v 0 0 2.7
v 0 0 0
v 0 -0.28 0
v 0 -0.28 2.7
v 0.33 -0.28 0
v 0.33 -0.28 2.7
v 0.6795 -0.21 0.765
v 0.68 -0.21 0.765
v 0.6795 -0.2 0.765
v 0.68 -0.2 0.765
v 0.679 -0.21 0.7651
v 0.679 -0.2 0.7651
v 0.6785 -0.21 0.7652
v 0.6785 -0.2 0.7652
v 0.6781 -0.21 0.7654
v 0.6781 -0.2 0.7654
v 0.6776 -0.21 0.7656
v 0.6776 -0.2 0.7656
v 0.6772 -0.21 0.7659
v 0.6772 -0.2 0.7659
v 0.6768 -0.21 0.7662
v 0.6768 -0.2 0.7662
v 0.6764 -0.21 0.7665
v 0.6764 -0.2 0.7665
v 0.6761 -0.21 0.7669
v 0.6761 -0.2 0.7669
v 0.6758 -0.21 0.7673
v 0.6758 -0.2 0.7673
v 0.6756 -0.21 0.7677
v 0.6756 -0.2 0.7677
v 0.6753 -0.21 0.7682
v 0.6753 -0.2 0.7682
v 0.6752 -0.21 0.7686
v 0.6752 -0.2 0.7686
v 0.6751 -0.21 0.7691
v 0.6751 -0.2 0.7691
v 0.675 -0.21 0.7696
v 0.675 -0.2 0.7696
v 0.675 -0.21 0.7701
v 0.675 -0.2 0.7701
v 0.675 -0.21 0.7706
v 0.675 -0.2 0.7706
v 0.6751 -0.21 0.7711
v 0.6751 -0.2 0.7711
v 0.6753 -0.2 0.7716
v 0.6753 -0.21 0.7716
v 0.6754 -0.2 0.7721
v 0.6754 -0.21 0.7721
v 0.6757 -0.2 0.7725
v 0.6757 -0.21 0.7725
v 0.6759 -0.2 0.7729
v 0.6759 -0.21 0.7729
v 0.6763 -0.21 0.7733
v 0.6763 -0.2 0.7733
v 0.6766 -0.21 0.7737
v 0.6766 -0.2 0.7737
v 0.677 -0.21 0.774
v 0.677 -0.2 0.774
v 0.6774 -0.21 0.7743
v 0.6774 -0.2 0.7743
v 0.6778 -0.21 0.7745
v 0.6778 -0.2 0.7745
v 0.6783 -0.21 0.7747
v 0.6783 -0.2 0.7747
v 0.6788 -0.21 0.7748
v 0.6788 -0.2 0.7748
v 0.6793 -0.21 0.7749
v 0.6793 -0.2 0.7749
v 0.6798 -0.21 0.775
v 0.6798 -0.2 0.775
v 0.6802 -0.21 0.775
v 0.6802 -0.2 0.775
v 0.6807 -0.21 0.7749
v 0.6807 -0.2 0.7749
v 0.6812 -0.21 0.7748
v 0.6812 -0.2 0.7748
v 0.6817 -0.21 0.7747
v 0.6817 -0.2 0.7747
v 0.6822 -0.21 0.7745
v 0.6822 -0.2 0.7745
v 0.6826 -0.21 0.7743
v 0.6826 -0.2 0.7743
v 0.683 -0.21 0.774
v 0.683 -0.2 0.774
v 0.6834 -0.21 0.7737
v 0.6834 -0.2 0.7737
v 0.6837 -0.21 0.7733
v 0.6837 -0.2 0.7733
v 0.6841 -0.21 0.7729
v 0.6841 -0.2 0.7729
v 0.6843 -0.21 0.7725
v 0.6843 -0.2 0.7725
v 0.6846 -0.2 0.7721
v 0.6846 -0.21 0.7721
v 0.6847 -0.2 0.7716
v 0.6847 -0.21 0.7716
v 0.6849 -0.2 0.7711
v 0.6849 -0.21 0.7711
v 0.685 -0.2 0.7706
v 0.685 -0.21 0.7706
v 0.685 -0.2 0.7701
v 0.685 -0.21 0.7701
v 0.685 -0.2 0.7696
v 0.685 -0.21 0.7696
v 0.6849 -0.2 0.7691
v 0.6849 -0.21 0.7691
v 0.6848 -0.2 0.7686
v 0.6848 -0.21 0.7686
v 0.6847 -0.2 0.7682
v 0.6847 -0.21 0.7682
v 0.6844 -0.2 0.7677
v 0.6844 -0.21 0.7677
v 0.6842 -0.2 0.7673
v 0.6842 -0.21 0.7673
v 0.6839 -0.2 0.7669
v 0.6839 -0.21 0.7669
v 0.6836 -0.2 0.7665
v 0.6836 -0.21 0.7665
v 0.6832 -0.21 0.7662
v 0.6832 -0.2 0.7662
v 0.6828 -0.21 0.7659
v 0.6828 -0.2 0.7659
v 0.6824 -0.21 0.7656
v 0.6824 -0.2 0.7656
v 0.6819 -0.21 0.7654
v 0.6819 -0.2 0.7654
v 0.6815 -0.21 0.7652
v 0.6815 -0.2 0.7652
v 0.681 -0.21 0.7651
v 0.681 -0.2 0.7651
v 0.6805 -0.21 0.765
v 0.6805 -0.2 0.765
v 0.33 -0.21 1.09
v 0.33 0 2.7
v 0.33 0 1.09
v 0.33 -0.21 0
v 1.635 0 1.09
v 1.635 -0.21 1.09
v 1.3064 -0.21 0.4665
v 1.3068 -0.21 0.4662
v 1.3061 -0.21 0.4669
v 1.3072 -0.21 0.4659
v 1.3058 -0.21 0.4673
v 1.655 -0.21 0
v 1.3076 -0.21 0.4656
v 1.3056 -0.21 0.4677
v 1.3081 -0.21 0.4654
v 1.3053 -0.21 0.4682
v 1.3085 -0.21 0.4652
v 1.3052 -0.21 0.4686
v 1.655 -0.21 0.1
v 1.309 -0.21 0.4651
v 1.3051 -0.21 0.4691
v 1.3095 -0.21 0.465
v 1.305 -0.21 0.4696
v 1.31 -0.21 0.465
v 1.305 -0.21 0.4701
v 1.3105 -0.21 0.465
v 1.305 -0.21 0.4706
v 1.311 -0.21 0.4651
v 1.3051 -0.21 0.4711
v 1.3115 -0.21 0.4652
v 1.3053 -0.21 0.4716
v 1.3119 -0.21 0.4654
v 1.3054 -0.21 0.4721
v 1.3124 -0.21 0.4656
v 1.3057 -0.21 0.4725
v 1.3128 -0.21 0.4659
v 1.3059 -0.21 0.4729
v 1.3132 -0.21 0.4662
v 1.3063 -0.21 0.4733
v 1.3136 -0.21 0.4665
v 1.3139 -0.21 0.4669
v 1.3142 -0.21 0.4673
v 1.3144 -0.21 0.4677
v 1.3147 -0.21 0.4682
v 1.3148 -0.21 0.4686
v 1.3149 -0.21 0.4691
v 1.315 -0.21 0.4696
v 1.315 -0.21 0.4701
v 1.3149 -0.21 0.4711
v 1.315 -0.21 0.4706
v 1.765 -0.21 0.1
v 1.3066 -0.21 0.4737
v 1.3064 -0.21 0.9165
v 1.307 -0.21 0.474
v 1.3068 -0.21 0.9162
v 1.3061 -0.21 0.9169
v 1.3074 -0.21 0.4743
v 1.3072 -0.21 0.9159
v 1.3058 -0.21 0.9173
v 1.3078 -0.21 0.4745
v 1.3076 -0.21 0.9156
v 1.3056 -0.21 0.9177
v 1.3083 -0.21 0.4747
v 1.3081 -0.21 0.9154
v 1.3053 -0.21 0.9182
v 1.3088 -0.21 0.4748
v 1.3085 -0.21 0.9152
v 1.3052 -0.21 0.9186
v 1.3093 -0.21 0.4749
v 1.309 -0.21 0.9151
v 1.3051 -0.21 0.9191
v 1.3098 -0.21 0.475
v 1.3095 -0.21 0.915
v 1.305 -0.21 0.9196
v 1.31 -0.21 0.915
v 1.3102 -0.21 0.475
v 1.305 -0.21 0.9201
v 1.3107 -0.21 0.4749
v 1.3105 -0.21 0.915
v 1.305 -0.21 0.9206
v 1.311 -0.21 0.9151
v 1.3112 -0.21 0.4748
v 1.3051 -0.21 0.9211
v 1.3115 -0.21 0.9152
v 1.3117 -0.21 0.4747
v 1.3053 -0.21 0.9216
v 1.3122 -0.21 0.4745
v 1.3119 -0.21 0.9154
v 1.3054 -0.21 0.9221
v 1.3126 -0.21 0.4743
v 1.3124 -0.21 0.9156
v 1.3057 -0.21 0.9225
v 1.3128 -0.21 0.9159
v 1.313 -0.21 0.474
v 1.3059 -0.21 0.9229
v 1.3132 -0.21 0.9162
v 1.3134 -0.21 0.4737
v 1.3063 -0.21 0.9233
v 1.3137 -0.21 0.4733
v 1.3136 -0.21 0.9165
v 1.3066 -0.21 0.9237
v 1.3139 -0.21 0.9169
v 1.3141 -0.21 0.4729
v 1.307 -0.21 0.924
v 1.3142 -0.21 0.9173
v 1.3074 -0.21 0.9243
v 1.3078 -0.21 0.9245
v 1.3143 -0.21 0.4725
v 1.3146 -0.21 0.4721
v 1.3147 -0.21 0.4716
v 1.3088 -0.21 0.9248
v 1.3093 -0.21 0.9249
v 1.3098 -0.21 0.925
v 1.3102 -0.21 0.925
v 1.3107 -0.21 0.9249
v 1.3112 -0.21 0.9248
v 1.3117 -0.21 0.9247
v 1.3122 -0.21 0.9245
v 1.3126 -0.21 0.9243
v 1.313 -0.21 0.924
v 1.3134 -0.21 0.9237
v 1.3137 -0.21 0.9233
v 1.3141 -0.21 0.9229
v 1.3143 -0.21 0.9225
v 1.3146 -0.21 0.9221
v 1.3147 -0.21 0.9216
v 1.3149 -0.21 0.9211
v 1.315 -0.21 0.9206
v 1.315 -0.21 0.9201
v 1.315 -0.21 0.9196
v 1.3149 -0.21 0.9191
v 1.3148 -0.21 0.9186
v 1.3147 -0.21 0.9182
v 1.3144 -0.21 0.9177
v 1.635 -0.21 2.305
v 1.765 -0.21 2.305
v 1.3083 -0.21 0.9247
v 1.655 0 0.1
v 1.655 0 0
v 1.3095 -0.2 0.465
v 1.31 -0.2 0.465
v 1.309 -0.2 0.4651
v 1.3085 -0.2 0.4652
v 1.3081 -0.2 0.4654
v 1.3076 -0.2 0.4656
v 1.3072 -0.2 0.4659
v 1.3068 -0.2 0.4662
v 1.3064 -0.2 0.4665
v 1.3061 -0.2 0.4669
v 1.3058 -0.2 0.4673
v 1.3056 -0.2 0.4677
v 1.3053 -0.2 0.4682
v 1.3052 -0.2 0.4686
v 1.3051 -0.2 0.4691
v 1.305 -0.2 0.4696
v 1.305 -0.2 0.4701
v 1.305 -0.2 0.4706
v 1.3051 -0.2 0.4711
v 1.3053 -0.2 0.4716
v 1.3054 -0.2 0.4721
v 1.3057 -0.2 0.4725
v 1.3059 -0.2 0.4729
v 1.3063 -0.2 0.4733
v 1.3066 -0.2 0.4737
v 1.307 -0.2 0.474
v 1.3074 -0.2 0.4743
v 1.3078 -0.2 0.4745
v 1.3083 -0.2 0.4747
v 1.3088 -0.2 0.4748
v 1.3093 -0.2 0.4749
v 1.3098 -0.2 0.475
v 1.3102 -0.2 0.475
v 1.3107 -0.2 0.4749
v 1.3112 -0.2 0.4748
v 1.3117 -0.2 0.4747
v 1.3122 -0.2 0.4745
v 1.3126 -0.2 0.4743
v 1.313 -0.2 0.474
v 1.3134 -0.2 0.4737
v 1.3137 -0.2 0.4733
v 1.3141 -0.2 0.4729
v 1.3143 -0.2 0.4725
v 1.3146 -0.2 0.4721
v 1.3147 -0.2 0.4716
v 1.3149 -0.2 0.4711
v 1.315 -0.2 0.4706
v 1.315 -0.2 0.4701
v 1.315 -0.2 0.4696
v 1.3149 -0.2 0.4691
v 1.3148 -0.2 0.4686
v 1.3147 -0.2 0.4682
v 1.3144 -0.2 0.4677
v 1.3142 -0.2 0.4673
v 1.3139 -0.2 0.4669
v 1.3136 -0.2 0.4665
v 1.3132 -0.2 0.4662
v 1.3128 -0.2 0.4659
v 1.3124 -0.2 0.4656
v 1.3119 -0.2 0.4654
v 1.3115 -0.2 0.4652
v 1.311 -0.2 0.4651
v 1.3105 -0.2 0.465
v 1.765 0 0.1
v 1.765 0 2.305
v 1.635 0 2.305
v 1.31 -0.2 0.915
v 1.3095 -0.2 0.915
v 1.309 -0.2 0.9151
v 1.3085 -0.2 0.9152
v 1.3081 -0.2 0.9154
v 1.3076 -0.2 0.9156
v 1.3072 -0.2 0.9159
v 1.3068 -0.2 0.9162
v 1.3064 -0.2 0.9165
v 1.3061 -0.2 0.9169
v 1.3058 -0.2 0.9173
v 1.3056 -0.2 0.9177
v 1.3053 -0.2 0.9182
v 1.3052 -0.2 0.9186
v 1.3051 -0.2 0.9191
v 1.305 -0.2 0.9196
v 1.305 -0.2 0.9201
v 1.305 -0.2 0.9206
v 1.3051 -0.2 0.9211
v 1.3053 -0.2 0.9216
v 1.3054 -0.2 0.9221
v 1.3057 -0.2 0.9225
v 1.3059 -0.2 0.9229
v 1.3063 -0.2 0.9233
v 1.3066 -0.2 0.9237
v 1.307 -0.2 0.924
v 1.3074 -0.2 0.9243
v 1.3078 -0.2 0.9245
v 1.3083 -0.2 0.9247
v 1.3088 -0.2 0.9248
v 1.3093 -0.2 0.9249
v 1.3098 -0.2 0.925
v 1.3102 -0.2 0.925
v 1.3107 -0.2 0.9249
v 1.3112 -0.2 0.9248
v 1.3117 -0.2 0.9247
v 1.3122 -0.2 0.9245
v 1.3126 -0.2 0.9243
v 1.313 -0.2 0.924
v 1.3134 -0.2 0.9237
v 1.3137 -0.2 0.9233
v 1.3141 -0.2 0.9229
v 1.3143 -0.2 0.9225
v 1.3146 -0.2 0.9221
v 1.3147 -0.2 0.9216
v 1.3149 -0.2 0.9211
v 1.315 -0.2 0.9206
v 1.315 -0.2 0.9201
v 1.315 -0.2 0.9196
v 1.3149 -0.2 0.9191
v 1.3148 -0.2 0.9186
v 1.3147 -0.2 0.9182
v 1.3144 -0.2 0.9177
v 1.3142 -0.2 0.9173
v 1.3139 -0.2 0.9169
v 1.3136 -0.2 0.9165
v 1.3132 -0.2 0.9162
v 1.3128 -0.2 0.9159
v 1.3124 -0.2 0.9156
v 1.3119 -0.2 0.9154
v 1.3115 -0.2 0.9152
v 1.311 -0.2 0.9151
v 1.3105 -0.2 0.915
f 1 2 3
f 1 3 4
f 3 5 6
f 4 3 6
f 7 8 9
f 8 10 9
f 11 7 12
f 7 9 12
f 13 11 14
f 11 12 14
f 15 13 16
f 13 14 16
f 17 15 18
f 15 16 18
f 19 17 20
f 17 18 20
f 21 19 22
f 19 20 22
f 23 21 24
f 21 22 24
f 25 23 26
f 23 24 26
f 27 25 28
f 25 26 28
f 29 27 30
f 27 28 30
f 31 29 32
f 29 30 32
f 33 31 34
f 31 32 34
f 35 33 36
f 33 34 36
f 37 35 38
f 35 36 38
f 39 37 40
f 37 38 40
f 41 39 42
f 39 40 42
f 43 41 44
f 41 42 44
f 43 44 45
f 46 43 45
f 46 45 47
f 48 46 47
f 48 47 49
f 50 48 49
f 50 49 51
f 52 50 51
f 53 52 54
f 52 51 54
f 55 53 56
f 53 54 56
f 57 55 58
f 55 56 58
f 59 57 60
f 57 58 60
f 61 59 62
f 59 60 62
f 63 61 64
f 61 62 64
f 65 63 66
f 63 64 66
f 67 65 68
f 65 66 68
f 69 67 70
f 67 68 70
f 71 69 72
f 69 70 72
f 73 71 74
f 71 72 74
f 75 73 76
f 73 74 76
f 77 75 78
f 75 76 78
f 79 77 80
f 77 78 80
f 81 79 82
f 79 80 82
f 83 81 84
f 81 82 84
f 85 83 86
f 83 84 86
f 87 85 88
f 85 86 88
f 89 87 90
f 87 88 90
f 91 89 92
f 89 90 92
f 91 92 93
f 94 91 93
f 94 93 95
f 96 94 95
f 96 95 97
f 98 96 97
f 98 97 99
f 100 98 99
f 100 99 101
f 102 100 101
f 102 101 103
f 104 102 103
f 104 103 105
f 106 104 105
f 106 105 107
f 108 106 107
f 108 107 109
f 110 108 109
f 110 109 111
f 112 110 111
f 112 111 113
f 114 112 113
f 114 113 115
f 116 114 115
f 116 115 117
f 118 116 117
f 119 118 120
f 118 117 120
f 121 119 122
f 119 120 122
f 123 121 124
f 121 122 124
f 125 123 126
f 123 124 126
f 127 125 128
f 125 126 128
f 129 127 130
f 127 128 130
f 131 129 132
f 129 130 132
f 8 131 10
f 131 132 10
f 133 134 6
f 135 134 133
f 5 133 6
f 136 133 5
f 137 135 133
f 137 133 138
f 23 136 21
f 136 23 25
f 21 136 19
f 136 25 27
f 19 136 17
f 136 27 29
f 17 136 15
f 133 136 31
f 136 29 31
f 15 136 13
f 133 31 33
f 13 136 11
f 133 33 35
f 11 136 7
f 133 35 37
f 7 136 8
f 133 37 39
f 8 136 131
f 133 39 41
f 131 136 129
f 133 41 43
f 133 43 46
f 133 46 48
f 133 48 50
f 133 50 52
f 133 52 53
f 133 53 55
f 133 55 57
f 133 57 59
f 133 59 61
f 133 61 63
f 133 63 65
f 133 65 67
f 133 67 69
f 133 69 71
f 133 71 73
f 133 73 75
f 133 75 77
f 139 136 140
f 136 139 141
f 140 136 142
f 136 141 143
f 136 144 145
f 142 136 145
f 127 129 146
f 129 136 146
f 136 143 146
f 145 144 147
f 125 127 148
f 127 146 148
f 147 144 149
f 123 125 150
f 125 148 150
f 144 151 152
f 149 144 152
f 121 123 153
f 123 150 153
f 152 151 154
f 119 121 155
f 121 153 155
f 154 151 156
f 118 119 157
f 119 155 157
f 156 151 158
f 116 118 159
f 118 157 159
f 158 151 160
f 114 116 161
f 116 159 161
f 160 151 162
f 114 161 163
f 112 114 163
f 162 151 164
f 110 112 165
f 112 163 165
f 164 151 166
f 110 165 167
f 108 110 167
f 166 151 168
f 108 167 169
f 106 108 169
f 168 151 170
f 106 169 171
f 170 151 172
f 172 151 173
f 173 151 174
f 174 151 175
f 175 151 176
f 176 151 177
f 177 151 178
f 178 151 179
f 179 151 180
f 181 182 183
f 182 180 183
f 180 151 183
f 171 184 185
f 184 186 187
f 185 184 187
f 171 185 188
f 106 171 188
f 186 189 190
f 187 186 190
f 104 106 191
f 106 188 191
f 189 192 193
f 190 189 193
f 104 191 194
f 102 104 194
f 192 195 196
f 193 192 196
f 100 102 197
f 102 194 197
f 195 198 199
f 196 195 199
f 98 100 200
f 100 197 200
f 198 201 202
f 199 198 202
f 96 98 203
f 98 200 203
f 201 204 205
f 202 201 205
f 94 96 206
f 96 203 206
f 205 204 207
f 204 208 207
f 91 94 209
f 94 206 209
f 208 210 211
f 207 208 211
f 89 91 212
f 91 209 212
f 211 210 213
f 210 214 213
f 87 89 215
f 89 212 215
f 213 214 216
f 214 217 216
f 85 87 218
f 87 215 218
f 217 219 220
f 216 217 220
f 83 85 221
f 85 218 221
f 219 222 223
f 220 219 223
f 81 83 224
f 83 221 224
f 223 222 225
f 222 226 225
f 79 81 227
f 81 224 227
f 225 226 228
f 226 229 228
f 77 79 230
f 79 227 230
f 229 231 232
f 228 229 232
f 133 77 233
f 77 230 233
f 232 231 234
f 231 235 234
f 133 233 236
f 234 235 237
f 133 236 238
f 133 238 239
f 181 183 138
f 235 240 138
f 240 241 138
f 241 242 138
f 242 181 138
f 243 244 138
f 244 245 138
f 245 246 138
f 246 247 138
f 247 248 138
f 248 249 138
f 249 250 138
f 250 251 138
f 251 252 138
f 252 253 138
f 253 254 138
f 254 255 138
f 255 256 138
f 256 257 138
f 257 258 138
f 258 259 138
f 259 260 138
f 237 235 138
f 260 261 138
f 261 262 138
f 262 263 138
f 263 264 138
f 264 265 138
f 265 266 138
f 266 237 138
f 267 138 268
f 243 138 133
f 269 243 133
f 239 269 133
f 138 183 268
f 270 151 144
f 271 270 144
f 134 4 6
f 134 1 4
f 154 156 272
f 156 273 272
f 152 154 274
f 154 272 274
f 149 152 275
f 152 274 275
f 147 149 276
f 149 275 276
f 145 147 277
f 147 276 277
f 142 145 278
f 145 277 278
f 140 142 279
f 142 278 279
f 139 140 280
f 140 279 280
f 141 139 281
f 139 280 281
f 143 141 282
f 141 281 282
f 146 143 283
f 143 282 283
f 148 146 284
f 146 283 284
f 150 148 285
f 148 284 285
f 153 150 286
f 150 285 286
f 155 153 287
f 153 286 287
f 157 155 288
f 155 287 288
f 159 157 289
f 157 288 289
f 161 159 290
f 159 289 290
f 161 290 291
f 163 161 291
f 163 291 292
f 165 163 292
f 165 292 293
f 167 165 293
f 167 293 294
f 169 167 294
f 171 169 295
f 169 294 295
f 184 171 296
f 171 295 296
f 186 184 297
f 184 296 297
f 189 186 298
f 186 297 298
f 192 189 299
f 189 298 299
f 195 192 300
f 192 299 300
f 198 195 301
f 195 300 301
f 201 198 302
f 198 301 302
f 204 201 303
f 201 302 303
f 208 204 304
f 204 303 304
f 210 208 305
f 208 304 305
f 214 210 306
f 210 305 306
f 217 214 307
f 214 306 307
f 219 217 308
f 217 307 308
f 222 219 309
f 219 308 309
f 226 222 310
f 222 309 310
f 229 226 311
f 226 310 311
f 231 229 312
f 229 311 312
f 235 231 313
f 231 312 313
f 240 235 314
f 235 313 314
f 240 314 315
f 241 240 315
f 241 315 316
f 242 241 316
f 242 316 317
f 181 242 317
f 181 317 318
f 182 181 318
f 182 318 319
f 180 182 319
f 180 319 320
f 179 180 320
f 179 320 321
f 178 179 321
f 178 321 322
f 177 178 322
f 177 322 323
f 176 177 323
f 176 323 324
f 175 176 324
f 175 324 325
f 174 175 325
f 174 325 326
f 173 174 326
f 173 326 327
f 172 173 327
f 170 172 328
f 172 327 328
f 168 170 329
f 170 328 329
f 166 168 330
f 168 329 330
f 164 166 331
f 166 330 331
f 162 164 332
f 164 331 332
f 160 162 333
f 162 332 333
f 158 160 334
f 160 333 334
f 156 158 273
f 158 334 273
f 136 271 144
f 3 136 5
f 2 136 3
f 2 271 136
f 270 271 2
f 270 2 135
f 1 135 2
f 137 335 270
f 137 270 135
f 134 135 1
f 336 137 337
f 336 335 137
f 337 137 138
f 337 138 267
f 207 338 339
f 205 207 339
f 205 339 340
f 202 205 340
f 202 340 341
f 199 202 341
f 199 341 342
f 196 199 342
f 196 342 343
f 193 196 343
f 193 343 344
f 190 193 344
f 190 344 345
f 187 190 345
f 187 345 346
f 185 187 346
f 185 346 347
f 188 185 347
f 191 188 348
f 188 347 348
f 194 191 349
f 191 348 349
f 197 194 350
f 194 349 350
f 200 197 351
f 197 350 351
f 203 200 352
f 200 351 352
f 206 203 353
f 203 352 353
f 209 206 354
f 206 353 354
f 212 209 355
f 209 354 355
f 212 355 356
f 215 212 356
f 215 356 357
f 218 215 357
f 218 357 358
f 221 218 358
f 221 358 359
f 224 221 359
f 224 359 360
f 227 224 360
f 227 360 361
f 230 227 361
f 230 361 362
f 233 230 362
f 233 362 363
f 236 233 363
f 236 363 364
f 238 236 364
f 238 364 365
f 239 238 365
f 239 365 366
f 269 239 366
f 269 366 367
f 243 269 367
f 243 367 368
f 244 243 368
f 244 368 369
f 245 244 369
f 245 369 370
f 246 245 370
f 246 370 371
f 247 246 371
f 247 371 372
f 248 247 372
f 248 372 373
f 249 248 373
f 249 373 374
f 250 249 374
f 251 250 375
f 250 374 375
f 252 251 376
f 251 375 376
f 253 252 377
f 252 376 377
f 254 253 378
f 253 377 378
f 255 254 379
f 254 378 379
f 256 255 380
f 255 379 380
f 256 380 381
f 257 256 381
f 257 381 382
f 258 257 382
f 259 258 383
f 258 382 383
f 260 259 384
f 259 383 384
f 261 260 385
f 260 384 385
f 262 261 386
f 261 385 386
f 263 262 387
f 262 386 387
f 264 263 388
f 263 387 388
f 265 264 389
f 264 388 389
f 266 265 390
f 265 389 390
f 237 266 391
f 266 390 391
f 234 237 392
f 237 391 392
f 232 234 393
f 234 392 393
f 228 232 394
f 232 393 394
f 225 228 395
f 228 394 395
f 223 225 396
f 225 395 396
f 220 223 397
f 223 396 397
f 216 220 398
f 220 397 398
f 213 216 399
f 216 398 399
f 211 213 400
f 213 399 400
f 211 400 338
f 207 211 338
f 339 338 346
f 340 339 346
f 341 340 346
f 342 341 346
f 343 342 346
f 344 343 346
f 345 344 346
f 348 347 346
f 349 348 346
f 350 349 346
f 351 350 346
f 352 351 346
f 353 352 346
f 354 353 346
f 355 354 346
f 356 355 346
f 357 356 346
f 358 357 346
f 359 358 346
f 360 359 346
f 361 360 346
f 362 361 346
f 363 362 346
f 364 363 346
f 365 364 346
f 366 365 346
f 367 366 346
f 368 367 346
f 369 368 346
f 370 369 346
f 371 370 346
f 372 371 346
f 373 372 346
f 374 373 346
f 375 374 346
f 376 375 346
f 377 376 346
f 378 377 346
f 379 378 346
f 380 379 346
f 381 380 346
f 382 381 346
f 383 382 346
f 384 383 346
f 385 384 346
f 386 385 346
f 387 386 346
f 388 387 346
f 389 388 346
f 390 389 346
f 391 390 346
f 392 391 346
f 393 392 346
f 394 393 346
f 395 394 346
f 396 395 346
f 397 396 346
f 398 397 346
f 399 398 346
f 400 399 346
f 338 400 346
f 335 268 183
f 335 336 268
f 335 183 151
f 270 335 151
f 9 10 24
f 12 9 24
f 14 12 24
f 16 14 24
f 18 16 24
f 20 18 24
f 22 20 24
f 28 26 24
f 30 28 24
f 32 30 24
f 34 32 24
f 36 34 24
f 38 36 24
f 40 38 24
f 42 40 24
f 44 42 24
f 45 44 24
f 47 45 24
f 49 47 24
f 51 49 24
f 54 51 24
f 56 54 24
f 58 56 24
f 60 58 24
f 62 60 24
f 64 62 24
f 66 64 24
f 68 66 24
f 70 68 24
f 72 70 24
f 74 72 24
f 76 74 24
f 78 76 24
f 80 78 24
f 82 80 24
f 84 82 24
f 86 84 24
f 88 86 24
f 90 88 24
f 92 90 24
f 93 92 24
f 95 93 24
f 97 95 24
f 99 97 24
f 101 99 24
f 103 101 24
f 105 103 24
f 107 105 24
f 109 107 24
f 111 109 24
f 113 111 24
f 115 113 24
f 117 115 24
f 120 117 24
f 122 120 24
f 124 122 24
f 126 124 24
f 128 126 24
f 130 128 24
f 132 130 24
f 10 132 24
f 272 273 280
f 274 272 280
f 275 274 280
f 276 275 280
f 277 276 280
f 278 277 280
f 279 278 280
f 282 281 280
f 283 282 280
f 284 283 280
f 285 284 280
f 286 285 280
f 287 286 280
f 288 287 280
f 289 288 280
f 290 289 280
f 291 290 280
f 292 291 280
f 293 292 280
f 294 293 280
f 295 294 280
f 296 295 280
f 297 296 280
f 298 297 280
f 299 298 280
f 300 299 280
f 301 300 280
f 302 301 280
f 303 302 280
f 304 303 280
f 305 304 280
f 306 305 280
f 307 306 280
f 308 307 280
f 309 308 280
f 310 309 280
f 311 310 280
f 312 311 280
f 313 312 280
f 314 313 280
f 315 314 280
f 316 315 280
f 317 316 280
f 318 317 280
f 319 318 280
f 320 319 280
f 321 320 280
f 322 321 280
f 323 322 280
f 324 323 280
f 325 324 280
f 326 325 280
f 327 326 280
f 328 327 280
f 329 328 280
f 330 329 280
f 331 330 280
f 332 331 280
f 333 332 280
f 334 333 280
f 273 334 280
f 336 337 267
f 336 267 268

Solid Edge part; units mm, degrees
sketch "Sketch1" plane through (0, 0, 0) normal (0, -1, 0) x (1, 0, 0)
  line L0 (0, 0) -> (0, 2.7)
  line L1 (0, 2.7) -> (0.33, 2.7)
  line L2 (0.33, 2.7) -> (0.33, 1.09)
  line L3 (0.33, 1.09) -> (1.635, 1.09)
  line L4 (1.635, 1.09) -> (1.635, 2.305)
  line L5 (1.635, 2.305) -> (1.765, 2.305)
  line L6 (1.765, 2.305) -> (1.765, 0)
  line L7 (1.765, 0) -> (0, 0)
  dimension "D1" = 2.7
  dimension "D2" = 0.33
  dimension "D3" = 1.765
  dimension "D4" = 0.13
  dimension "D5" = 2.305
  dimension "D6" = 1.09
extrude "Protrusion1" add sketch "Sketch1" along normal blind 0.21
sketch "Sketch2" plane through (0.75, -0.21, 1.35) normal (0, -1, 0) x (0, 0, 1)
  line L0 (-1.35, 0.75) -> (1.35, 0.75)
  line L1 (1.35, 0.75) -> (1.35, 0.42)
  line L2 (1.35, 0.42) -> (-1.35, 0.42)
  line L3 (-1.35, 0.75) -> (-1.35, 0.42)
extrude "Ausprägung_2" add sketch "Sketch2" along normal blind 0.07
hole "Bohrung_1" at (1.31, -0.21, 0.92) direction (0, 1, 0) diameter 0.01 depth 0.01
hole "Hole1" at (1.31, -0.21, 0.47) direction (0, 1, 0) diameter 0.01 depth 0.01
hole "Hole2" at (0.68, -0.21, 0.77) direction (0, 1, 0) diameter 0.01 depth 0.01
sketch "Sketch3" plane through (1.0475, -0.21, 1.1525) normal (0, -1, 0) x (1, 0, 0)
  line L0 (0.7175, -1.0525) -> (0.7175, -1.1525)
  line L1 (0.7175, -1.1525) -> (0.6075, -1.1525)
  line L2 (0.6075, -1.0525) -> (0.6075, -1.1525)
  line L3 (0.7175, -1.0525) -> (0.6075, -1.0525)
  dimension "D1" = 0.1
  dimension "D2" = 0.11
extrude "Cutout1" cut sketch "Sketch3" against normal through all
